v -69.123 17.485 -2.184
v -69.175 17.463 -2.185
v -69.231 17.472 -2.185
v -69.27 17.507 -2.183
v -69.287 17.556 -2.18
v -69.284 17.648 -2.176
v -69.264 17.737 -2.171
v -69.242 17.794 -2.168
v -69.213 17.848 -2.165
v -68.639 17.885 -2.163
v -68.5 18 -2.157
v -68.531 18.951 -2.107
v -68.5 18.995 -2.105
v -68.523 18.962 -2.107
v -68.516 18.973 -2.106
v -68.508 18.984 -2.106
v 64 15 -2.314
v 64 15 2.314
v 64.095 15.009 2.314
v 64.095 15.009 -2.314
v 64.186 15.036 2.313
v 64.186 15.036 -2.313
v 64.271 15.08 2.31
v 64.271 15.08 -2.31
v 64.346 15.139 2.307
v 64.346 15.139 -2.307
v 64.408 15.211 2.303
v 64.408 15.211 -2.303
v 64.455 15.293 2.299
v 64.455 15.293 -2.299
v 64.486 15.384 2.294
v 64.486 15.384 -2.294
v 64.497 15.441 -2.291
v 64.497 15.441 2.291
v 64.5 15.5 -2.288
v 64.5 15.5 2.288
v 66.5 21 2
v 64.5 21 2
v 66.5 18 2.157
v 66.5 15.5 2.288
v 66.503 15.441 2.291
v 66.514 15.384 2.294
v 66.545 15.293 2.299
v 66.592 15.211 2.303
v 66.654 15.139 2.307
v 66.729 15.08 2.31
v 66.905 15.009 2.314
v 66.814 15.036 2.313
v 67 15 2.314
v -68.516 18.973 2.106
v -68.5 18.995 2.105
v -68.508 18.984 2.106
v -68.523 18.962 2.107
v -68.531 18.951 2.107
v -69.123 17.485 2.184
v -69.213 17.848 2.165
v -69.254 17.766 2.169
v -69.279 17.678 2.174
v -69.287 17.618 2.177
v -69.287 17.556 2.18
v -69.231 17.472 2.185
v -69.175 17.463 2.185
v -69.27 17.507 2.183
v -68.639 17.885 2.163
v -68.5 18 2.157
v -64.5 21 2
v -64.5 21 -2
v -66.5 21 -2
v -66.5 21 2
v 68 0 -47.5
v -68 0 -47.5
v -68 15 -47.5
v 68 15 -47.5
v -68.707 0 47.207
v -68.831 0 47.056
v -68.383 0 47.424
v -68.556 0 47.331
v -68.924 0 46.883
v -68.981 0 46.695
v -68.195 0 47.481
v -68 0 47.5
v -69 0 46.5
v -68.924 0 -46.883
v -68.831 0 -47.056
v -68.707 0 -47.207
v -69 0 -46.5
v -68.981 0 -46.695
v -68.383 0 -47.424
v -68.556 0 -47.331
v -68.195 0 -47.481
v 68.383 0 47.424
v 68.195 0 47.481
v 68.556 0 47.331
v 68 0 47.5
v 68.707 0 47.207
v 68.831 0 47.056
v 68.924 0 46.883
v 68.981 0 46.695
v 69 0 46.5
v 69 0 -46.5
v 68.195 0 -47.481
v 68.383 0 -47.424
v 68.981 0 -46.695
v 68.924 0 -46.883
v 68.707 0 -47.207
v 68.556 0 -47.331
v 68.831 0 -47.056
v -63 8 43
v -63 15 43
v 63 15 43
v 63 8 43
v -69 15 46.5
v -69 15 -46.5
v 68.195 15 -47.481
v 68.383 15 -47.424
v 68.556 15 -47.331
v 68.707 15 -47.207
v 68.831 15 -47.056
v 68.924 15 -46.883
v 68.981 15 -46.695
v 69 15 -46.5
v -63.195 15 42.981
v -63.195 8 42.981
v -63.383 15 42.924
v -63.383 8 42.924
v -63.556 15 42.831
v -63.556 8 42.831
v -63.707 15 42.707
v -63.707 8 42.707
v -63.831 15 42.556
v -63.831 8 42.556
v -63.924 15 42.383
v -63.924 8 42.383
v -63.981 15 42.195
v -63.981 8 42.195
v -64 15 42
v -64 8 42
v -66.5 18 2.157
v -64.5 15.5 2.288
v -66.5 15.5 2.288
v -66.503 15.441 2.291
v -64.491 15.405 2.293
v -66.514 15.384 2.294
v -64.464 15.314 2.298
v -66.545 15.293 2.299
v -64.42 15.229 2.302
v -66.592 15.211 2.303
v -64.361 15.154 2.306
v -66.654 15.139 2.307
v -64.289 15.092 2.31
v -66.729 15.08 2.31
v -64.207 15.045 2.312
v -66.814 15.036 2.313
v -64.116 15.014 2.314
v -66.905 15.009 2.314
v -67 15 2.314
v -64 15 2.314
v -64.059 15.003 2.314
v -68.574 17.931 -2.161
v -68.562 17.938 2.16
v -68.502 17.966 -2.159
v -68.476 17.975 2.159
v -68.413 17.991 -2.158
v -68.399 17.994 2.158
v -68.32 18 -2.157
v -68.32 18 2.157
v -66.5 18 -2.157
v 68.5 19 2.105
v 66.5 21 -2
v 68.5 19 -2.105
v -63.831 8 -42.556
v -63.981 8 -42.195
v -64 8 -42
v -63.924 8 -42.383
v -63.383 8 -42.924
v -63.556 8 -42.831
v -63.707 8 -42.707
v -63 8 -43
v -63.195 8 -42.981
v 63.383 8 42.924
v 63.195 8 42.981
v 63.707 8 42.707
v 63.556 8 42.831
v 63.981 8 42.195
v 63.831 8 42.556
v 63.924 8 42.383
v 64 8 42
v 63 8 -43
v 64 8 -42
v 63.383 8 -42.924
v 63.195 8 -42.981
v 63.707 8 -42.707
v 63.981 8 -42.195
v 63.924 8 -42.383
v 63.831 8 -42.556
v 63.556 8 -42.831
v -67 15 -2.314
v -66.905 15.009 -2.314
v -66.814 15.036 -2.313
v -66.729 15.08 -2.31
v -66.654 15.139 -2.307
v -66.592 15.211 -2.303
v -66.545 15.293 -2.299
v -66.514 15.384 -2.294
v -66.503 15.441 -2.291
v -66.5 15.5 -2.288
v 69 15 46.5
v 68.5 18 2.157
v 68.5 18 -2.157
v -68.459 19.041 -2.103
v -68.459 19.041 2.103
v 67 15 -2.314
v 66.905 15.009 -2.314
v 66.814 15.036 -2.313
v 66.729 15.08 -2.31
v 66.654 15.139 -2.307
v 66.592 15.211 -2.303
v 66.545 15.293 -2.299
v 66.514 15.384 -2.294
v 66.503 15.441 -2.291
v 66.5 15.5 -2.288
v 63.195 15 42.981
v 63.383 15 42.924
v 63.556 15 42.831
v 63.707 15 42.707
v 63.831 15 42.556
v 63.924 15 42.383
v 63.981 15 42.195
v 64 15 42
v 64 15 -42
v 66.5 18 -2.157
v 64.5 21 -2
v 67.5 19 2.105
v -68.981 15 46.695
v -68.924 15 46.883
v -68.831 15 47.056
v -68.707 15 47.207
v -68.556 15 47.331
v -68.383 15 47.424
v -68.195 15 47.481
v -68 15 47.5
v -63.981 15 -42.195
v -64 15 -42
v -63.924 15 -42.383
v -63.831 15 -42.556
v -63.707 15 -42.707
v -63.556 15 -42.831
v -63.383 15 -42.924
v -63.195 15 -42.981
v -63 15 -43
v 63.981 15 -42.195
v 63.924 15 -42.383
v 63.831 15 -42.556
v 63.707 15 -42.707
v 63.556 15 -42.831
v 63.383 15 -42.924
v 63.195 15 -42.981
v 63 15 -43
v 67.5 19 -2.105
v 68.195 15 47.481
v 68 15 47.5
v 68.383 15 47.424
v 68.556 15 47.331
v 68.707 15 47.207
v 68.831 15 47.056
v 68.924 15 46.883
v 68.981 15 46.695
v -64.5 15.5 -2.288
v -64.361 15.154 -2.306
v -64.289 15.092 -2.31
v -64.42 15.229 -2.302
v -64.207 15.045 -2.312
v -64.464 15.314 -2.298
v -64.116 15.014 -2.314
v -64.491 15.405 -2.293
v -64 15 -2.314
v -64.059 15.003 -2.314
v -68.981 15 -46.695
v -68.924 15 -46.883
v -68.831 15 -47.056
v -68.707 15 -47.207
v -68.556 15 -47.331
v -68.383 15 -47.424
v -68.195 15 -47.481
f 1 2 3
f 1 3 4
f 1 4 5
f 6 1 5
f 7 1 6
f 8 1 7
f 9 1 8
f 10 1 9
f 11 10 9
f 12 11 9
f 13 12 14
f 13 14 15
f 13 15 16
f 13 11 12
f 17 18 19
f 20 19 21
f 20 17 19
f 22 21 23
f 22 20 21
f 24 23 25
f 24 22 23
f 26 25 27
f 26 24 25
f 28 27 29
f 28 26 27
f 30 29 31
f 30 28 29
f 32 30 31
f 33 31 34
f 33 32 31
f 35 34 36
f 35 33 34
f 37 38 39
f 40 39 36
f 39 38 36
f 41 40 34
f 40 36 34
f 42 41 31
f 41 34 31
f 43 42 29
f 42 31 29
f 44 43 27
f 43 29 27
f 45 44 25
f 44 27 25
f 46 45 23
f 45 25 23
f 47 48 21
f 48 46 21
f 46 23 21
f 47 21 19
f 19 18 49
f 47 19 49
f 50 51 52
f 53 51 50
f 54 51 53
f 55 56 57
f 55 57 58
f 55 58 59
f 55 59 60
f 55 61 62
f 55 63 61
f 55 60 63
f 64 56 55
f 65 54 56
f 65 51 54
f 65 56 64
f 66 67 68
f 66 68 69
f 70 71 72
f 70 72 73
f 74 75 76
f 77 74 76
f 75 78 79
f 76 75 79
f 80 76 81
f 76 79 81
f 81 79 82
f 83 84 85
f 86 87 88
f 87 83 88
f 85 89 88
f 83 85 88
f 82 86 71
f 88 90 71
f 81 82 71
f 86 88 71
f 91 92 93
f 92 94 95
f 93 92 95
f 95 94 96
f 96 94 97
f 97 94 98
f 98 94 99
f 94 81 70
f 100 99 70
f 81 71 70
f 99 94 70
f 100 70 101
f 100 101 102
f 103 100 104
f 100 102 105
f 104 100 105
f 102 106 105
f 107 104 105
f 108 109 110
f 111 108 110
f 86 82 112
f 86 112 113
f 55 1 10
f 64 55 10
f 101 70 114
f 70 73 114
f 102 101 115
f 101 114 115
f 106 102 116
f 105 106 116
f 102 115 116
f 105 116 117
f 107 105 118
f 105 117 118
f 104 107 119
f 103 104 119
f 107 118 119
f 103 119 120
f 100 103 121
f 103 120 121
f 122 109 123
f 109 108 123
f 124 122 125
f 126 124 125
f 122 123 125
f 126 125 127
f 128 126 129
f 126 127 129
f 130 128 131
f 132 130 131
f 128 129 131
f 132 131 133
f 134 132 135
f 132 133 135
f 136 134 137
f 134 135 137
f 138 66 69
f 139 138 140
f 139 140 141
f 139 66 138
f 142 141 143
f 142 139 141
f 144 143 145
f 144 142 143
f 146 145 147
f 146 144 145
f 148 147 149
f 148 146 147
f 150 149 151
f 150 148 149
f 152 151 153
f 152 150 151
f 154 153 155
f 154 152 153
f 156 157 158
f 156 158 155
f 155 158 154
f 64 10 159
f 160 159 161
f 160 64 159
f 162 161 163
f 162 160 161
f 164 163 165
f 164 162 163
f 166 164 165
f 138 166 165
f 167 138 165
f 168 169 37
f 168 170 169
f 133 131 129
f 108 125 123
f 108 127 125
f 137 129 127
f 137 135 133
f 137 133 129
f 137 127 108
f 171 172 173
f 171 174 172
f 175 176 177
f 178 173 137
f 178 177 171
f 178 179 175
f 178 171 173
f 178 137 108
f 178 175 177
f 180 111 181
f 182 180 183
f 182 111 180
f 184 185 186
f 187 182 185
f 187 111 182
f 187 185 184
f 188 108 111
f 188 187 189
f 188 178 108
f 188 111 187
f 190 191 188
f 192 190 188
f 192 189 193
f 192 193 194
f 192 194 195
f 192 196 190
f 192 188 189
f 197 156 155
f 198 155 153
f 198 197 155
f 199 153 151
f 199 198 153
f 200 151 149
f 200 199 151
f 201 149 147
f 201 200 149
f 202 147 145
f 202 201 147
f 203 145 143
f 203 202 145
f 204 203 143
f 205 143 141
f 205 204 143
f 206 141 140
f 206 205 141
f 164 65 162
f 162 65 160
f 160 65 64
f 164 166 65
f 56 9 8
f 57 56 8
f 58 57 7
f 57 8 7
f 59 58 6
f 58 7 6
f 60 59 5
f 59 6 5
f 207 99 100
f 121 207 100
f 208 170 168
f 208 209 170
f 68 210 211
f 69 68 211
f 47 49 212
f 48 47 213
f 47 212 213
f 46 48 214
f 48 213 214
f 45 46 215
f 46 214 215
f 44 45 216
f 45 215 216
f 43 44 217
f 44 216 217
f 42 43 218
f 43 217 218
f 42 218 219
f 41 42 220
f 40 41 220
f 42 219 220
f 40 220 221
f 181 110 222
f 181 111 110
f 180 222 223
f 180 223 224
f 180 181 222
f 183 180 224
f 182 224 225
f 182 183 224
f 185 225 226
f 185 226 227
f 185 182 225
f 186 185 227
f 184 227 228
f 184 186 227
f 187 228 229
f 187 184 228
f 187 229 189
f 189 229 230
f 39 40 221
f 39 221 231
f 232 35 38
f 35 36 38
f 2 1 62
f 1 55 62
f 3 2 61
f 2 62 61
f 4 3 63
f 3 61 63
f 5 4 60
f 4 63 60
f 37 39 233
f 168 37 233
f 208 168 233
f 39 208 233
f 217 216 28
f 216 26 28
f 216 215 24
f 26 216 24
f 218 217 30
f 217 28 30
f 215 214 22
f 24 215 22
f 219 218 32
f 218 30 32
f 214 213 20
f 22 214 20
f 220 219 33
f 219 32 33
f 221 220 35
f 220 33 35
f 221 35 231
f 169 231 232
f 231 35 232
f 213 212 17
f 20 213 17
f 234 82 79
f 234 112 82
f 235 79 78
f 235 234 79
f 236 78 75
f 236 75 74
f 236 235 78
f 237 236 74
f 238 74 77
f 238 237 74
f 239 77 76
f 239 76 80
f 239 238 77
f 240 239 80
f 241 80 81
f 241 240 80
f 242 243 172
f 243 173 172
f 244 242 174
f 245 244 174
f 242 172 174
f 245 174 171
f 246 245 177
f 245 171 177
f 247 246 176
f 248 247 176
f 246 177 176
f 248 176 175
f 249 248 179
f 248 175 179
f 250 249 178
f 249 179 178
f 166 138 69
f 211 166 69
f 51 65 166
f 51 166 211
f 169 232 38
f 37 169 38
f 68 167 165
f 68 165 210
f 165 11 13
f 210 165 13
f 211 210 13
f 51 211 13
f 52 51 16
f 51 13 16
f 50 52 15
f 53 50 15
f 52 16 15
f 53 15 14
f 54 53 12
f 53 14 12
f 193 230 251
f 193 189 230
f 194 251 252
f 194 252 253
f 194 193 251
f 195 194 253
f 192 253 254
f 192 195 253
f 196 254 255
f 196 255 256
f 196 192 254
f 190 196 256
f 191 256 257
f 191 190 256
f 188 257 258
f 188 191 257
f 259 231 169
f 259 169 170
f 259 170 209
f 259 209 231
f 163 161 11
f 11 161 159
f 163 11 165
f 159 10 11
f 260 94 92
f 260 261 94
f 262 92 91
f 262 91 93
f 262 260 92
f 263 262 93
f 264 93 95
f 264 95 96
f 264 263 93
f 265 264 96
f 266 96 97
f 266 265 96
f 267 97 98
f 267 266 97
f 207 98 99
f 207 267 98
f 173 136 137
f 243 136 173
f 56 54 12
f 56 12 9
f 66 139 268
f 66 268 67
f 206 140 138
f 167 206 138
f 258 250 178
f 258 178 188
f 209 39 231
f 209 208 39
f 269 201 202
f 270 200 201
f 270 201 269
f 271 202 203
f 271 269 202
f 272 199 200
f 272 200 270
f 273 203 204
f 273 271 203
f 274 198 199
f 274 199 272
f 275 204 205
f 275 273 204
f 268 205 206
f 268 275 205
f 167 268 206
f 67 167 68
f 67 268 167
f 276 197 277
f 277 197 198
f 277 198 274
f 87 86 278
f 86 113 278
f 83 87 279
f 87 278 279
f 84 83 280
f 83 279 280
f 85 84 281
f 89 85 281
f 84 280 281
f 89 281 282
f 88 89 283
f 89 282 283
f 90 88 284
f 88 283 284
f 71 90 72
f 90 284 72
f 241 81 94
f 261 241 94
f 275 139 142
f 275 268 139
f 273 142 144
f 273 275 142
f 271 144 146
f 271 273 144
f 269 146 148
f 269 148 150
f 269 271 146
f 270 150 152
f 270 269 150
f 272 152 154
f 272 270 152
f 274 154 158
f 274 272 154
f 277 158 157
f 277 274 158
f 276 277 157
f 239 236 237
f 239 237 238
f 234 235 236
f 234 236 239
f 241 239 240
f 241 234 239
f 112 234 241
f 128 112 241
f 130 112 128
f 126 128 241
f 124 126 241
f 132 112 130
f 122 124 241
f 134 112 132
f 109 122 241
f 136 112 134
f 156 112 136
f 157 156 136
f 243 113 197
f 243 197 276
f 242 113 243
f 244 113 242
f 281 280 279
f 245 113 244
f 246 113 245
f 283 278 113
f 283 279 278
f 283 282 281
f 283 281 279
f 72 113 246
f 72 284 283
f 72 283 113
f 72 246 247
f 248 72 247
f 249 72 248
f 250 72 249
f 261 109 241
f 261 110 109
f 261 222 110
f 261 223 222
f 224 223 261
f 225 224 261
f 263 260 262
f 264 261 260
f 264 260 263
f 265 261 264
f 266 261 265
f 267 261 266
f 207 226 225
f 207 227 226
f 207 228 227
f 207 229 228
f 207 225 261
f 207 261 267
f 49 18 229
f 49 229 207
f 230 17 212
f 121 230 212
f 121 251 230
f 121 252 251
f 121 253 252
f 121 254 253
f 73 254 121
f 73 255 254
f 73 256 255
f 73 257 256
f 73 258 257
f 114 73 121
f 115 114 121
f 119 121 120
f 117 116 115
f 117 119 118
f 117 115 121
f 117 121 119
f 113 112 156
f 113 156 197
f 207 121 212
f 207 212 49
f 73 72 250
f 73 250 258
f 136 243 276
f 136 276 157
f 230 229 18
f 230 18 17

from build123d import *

# Parameters (mm, degrees)
SKETCH1_W           = 138
SKETCH1_H           = 95
BOSS_EXTRUDE1_DEPTH = 15
SKETCH2_W           = 128
SKETCH2_H           = 86
CUT_EXTRUDE1_DEPTH  = 7
SNAP_START          = 64.5
SNAP_HOOK2_DEPTH    = 2
SNAP_HOOK2_2_DEPTH  = 2
FILLET1_R           = 1
FILLET2_R           = 0.5
BOSS_EXTRUDE2_DEPTH = 2
FILLET3_R           = 0.5
FILLET4_R           = 0.5
FILLET7_R           = 0.1


with BuildPart() as part:
    # Sketch1 → Boss-Extrude1 (new body)
    with BuildSketch(Plane(origin=(0, 0, 0), x_dir=(1, 0, 0), z_dir=(0, 1, 0))):
        Rectangle(SKETCH1_W, SKETCH1_H)
    extrude(amount=BOSS_EXTRUDE1_DEPTH)

    # Sketch2 → Cut-Extrude1 (cut)
    with BuildSketch(Plane(origin=(0, 15, 0), x_dir=(1, 0, 0), z_dir=(0, 1, 0))):
        Rectangle(SKETCH2_W, SKETCH2_H)
    extrude(amount=-CUT_EXTRUDE1_DEPTH, mode=Mode.SUBTRACT)



with BuildPart() as body_2:
    # Snap Hook2: read off the stored shape, not the designer's step
    # Snap Hook2 outline → Snap Hook2 (new body)
    with BuildSketch(Plane.YZ.offset(SNAP_START)):
        Polygon((21, -2), (21, 2), (18, 2.157223338), (18, -2.157223338), align=None)
    snap_hook2 = extrude(amount=SNAP_HOOK2_DEPTH)


with BuildPart() as part_1:
    add(part.part)

    add(body_2.part)  # Snap Hook2 2 merges body 2
    # Snap Hook2 2 outline → Snap Hook2 2 (add)
    with BuildSketch(Plane.YZ.offset(SNAP_START)):
        Polygon((18, -2.157223338), (18, 2.157223338), (15, 2.314446676), (15, -2.314446676), align=None)
    snap_hook2_2 = extrude(amount=SNAP_HOOK2_2_DEPTH)

    # Snap Hook2 3: loft between two sections, ruled curve by curve
    snap_hook2_3_from = [
        Edge.make_line((66.5, 21, -2), (66.5, 21, 2)),
        Edge.make_line((66.5, 18, 2.157223338), (66.5, 18, -2.157223338)),
        Edge.make_line((66.5, 18, 2.157223338), (66.5, 21, 2)),
        Edge.make_line((66.5, 18, -2.157223338), (66.5, 21, -2)),
    ]
    snap_hook2_3_to = [
        Edge.make_line((68.5, 19, -2.104815559), (68.5, 19, 2.104815559)),
        Edge.make_line((68.5, 18, 2.157223338), (68.5, 18, -2.157223338)),
        Edge.make_line((68.5, 18, 2.157223338), (68.5, 19, 2.104815559)),
        Edge.make_line((68.5, 18, -2.157223338), (68.5, 19, -2.104815559)),
    ]
    snap_hook2_3 = Solid(Shell([*[Face.make_surface_from_curves(snap_hook2_3_from[k], snap_hook2_3_to[k]) for k in range(4)], Face(Wire(snap_hook2_3_from)), Face(Wire(snap_hook2_3_to))]))
    add(snap_hook2_3)

    # Fillet1
    fillet1_edges = [part_1.edges().sort_by_distance(p)[0] for p in [
        (64, 11.5, -43),
        (64, 11.5, 43),
        (-64, 11.5, 43),
        (-64, 11.5, -43),
        (-69, 7.5, -47.5),
        (69, 7.5, -47.5),
        (69, 7.5, 47.5),
        (-69, 7.5, 47.5),
    ]]
    fillet(fillet1_edges, radius=FILLET1_R)

    # Mirror1: Snap Hook2, Snap Hook2 2, Snap Hook2 3 across plane
    add(snap_hook2.mirror(Plane(origin=(0, 0, 0), x_dir=(0, 0, 1), z_dir=(1, 0, 0))))
    add(snap_hook2_2.mirror(Plane(origin=(0, 0, 0), x_dir=(0, 0, 1), z_dir=(1, 0, 0))))
    add(snap_hook2_3.mirror(Plane(origin=(0, 0, 0), x_dir=(0, 0, 1), z_dir=(1, 0, 0))))

    # Fillet2
    fillet2_edges = [part_1.edges().sort_by_distance(p)[0] for p in [
        (66.5, 15, 0),
        (64.5, 15, 0),
        (-66.5, 15, 0),
        (-64.5, 15, 0),
    ]]
    fillet(fillet2_edges, radius=FILLET2_R - 0.0001)  # a hair under: the kernel refuses the full size

    # Sketch5 → Boss-Extrude2 (add)
    with BuildSketch(Plane.ZY.offset(68.5)):
        Polygon((-2.104815559, 19), (2.104815559, 19), (2.189499682, 17.384130663), (-2.189499682, 17.384130663), align=None)
    extrude(amount=BOSS_EXTRUDE2_DEPTH)

    # Cut-Sweep1: sweep along a curve in space
    with BuildLine() as cut_sweep1_path:
        Line((-70.5, 17.384130663, -2.189499682), (-70.5, 17.384130663, 2.189499682))
    # Sketch6 → Cut-Sweep1 (sweep, cut)
    with BuildSketch(Plane(origin=(0, 0.162048562, -3.09207076), x_dir=(-1, 0, 0), z_dir=(0, 0.052335956242943814, -0.998629534754574))):
        Polygon((68.5, 17.862431279), (69.245478091, 17.245716756), (68.5, 17.245716756), align=None)
    sweep(path=cut_sweep1_path.line, mode=Mode.SUBTRACT)

    # Cut-Sweep2: sweep along a curve in space
    with BuildLine() as cut_sweep2_path:
        Line((-70.5, 17.384130663, -2.189499682), (-70.5, 17.384130663, 2.189499682))
    # Sketch7 → Cut-Sweep2 (sweep, cut)
    with BuildSketch(Plane(origin=(0, 0.162048562, -3.09207076), x_dir=(-1, 0, 0), z_dir=(0, 0.052335956242943814, -0.998629534754574))):
        Polygon((68.5, 18.863803625), (69.5, 17.245716756), (70.5, 17.245716756), (70.5, 18.863803625), align=None)
    sweep(path=cut_sweep2_path.line, mode=Mode.SUBTRACT)

    # Fillet3
    # the kernel refuses this fillet: 0.5 mm, written as the material it adds along each edge
    with BuildSketch(Plane(origin=(-68.5, 18, 2.606776404), x_dir=(1, 0, 0), z_dir=(0, 0, -1))) as fillet3_piece_1_section:
        with BuildLine():
            CenterArc((FILLET3_R * 0.359642452732, FILLET3_R), FILLET3_R, 230.43852258, 39.56147742)
            Line((-FILLET3_R * 0.277263341593, FILLET3_R * 0.22905836203), (0, 0))
            Line((0, 0), (FILLET3_R * 0.359642452732, 0))
        make_face()
    fillet3_piece_1 = extrude(amount=5.213552808, mode=Mode.PRIVATE)
    fillet3_piece_1 = split(fillet3_piece_1, bisect_by=Plane(origin=(-68.5, 17.976504454, 2.158454687), z_dir=(0, -0.052335956242943654, -0.9986295347545739)), keep=Keep.TOP, mode=Mode.PRIVATE)
    fillet3_piece_1 = split(fillet3_piece_1, bisect_by=Plane(origin=(-68.5, 18.248986786, -2.144174493), z_dir=(0, -0.05233595624294393, 0.9986295347545739)), keep=Keep.TOP, mode=Mode.PRIVATE)
    add(fillet3_piece_1)
    # the kernel refuses this fillet: 0.5 mm, written as the material it takes off along each edge
    with BuildSketch(Plane(origin=(-68.5, 19, -2.249978478), x_dir=(0.7071067811865781, 0.7071067811865169, 0), z_dir=(0, 0, 1))) as fillet3_2_piece_1:
        with BuildLine():
            CenterArc((FILLET3_R * 0.11613033532, -FILLET3_R), FILLET3_R, 90, 13.248212602)
            Line((-FILLET3_R * 0.11303968997, -FILLET3_R * 0.0266135918822), (0, 0))
            Line((0, 0), (FILLET3_R * 0.11613033532, 0))
        make_face()
    extrude(amount=4.499956956, mode=Mode.SUBTRACT)

    # Fillet4
    # the kernel refuses this fillet: 0.5 mm, written as the material it takes off along each edge
    with BuildSketch(Plane(origin=(-69.5, 17.384130663, -3.553874189), x_dir=(0.5262404509675064, 0.8503358088223238, 0), z_dir=(0, 0, 1))) as fillet4_piece_1:
        with BuildLine():
            CenterArc((0.545749803, -0.5), FILLET4_R, 90, 55.448844763)
            Line((0.133939724, -0.216429093), (0.125703523, -0.210757675))
            ThreePointArc((0.125703523, -0.210757675), (0.058466504, -0.113476951), (-0.008503358, -0.005262405))
            Line((-0.008503358, -0.005262405), (0, 0.01))
            Line((0, 0.01), (0.545749803, 0.01))
            Line((0.545749803, 0.01), (0.545749803, 0))
        make_face()
    extrude(amount=7.107748378, mode=Mode.SUBTRACT)

    # Fillet7
    fillet7_edges = [part_1.edges().sort_by_distance(p)[0] for p in [
        (-69.245478091, 17.384130663, 0),
    ]]
    fillet(fillet7_edges, radius=FILLET7_R)


solid = part_1.part
